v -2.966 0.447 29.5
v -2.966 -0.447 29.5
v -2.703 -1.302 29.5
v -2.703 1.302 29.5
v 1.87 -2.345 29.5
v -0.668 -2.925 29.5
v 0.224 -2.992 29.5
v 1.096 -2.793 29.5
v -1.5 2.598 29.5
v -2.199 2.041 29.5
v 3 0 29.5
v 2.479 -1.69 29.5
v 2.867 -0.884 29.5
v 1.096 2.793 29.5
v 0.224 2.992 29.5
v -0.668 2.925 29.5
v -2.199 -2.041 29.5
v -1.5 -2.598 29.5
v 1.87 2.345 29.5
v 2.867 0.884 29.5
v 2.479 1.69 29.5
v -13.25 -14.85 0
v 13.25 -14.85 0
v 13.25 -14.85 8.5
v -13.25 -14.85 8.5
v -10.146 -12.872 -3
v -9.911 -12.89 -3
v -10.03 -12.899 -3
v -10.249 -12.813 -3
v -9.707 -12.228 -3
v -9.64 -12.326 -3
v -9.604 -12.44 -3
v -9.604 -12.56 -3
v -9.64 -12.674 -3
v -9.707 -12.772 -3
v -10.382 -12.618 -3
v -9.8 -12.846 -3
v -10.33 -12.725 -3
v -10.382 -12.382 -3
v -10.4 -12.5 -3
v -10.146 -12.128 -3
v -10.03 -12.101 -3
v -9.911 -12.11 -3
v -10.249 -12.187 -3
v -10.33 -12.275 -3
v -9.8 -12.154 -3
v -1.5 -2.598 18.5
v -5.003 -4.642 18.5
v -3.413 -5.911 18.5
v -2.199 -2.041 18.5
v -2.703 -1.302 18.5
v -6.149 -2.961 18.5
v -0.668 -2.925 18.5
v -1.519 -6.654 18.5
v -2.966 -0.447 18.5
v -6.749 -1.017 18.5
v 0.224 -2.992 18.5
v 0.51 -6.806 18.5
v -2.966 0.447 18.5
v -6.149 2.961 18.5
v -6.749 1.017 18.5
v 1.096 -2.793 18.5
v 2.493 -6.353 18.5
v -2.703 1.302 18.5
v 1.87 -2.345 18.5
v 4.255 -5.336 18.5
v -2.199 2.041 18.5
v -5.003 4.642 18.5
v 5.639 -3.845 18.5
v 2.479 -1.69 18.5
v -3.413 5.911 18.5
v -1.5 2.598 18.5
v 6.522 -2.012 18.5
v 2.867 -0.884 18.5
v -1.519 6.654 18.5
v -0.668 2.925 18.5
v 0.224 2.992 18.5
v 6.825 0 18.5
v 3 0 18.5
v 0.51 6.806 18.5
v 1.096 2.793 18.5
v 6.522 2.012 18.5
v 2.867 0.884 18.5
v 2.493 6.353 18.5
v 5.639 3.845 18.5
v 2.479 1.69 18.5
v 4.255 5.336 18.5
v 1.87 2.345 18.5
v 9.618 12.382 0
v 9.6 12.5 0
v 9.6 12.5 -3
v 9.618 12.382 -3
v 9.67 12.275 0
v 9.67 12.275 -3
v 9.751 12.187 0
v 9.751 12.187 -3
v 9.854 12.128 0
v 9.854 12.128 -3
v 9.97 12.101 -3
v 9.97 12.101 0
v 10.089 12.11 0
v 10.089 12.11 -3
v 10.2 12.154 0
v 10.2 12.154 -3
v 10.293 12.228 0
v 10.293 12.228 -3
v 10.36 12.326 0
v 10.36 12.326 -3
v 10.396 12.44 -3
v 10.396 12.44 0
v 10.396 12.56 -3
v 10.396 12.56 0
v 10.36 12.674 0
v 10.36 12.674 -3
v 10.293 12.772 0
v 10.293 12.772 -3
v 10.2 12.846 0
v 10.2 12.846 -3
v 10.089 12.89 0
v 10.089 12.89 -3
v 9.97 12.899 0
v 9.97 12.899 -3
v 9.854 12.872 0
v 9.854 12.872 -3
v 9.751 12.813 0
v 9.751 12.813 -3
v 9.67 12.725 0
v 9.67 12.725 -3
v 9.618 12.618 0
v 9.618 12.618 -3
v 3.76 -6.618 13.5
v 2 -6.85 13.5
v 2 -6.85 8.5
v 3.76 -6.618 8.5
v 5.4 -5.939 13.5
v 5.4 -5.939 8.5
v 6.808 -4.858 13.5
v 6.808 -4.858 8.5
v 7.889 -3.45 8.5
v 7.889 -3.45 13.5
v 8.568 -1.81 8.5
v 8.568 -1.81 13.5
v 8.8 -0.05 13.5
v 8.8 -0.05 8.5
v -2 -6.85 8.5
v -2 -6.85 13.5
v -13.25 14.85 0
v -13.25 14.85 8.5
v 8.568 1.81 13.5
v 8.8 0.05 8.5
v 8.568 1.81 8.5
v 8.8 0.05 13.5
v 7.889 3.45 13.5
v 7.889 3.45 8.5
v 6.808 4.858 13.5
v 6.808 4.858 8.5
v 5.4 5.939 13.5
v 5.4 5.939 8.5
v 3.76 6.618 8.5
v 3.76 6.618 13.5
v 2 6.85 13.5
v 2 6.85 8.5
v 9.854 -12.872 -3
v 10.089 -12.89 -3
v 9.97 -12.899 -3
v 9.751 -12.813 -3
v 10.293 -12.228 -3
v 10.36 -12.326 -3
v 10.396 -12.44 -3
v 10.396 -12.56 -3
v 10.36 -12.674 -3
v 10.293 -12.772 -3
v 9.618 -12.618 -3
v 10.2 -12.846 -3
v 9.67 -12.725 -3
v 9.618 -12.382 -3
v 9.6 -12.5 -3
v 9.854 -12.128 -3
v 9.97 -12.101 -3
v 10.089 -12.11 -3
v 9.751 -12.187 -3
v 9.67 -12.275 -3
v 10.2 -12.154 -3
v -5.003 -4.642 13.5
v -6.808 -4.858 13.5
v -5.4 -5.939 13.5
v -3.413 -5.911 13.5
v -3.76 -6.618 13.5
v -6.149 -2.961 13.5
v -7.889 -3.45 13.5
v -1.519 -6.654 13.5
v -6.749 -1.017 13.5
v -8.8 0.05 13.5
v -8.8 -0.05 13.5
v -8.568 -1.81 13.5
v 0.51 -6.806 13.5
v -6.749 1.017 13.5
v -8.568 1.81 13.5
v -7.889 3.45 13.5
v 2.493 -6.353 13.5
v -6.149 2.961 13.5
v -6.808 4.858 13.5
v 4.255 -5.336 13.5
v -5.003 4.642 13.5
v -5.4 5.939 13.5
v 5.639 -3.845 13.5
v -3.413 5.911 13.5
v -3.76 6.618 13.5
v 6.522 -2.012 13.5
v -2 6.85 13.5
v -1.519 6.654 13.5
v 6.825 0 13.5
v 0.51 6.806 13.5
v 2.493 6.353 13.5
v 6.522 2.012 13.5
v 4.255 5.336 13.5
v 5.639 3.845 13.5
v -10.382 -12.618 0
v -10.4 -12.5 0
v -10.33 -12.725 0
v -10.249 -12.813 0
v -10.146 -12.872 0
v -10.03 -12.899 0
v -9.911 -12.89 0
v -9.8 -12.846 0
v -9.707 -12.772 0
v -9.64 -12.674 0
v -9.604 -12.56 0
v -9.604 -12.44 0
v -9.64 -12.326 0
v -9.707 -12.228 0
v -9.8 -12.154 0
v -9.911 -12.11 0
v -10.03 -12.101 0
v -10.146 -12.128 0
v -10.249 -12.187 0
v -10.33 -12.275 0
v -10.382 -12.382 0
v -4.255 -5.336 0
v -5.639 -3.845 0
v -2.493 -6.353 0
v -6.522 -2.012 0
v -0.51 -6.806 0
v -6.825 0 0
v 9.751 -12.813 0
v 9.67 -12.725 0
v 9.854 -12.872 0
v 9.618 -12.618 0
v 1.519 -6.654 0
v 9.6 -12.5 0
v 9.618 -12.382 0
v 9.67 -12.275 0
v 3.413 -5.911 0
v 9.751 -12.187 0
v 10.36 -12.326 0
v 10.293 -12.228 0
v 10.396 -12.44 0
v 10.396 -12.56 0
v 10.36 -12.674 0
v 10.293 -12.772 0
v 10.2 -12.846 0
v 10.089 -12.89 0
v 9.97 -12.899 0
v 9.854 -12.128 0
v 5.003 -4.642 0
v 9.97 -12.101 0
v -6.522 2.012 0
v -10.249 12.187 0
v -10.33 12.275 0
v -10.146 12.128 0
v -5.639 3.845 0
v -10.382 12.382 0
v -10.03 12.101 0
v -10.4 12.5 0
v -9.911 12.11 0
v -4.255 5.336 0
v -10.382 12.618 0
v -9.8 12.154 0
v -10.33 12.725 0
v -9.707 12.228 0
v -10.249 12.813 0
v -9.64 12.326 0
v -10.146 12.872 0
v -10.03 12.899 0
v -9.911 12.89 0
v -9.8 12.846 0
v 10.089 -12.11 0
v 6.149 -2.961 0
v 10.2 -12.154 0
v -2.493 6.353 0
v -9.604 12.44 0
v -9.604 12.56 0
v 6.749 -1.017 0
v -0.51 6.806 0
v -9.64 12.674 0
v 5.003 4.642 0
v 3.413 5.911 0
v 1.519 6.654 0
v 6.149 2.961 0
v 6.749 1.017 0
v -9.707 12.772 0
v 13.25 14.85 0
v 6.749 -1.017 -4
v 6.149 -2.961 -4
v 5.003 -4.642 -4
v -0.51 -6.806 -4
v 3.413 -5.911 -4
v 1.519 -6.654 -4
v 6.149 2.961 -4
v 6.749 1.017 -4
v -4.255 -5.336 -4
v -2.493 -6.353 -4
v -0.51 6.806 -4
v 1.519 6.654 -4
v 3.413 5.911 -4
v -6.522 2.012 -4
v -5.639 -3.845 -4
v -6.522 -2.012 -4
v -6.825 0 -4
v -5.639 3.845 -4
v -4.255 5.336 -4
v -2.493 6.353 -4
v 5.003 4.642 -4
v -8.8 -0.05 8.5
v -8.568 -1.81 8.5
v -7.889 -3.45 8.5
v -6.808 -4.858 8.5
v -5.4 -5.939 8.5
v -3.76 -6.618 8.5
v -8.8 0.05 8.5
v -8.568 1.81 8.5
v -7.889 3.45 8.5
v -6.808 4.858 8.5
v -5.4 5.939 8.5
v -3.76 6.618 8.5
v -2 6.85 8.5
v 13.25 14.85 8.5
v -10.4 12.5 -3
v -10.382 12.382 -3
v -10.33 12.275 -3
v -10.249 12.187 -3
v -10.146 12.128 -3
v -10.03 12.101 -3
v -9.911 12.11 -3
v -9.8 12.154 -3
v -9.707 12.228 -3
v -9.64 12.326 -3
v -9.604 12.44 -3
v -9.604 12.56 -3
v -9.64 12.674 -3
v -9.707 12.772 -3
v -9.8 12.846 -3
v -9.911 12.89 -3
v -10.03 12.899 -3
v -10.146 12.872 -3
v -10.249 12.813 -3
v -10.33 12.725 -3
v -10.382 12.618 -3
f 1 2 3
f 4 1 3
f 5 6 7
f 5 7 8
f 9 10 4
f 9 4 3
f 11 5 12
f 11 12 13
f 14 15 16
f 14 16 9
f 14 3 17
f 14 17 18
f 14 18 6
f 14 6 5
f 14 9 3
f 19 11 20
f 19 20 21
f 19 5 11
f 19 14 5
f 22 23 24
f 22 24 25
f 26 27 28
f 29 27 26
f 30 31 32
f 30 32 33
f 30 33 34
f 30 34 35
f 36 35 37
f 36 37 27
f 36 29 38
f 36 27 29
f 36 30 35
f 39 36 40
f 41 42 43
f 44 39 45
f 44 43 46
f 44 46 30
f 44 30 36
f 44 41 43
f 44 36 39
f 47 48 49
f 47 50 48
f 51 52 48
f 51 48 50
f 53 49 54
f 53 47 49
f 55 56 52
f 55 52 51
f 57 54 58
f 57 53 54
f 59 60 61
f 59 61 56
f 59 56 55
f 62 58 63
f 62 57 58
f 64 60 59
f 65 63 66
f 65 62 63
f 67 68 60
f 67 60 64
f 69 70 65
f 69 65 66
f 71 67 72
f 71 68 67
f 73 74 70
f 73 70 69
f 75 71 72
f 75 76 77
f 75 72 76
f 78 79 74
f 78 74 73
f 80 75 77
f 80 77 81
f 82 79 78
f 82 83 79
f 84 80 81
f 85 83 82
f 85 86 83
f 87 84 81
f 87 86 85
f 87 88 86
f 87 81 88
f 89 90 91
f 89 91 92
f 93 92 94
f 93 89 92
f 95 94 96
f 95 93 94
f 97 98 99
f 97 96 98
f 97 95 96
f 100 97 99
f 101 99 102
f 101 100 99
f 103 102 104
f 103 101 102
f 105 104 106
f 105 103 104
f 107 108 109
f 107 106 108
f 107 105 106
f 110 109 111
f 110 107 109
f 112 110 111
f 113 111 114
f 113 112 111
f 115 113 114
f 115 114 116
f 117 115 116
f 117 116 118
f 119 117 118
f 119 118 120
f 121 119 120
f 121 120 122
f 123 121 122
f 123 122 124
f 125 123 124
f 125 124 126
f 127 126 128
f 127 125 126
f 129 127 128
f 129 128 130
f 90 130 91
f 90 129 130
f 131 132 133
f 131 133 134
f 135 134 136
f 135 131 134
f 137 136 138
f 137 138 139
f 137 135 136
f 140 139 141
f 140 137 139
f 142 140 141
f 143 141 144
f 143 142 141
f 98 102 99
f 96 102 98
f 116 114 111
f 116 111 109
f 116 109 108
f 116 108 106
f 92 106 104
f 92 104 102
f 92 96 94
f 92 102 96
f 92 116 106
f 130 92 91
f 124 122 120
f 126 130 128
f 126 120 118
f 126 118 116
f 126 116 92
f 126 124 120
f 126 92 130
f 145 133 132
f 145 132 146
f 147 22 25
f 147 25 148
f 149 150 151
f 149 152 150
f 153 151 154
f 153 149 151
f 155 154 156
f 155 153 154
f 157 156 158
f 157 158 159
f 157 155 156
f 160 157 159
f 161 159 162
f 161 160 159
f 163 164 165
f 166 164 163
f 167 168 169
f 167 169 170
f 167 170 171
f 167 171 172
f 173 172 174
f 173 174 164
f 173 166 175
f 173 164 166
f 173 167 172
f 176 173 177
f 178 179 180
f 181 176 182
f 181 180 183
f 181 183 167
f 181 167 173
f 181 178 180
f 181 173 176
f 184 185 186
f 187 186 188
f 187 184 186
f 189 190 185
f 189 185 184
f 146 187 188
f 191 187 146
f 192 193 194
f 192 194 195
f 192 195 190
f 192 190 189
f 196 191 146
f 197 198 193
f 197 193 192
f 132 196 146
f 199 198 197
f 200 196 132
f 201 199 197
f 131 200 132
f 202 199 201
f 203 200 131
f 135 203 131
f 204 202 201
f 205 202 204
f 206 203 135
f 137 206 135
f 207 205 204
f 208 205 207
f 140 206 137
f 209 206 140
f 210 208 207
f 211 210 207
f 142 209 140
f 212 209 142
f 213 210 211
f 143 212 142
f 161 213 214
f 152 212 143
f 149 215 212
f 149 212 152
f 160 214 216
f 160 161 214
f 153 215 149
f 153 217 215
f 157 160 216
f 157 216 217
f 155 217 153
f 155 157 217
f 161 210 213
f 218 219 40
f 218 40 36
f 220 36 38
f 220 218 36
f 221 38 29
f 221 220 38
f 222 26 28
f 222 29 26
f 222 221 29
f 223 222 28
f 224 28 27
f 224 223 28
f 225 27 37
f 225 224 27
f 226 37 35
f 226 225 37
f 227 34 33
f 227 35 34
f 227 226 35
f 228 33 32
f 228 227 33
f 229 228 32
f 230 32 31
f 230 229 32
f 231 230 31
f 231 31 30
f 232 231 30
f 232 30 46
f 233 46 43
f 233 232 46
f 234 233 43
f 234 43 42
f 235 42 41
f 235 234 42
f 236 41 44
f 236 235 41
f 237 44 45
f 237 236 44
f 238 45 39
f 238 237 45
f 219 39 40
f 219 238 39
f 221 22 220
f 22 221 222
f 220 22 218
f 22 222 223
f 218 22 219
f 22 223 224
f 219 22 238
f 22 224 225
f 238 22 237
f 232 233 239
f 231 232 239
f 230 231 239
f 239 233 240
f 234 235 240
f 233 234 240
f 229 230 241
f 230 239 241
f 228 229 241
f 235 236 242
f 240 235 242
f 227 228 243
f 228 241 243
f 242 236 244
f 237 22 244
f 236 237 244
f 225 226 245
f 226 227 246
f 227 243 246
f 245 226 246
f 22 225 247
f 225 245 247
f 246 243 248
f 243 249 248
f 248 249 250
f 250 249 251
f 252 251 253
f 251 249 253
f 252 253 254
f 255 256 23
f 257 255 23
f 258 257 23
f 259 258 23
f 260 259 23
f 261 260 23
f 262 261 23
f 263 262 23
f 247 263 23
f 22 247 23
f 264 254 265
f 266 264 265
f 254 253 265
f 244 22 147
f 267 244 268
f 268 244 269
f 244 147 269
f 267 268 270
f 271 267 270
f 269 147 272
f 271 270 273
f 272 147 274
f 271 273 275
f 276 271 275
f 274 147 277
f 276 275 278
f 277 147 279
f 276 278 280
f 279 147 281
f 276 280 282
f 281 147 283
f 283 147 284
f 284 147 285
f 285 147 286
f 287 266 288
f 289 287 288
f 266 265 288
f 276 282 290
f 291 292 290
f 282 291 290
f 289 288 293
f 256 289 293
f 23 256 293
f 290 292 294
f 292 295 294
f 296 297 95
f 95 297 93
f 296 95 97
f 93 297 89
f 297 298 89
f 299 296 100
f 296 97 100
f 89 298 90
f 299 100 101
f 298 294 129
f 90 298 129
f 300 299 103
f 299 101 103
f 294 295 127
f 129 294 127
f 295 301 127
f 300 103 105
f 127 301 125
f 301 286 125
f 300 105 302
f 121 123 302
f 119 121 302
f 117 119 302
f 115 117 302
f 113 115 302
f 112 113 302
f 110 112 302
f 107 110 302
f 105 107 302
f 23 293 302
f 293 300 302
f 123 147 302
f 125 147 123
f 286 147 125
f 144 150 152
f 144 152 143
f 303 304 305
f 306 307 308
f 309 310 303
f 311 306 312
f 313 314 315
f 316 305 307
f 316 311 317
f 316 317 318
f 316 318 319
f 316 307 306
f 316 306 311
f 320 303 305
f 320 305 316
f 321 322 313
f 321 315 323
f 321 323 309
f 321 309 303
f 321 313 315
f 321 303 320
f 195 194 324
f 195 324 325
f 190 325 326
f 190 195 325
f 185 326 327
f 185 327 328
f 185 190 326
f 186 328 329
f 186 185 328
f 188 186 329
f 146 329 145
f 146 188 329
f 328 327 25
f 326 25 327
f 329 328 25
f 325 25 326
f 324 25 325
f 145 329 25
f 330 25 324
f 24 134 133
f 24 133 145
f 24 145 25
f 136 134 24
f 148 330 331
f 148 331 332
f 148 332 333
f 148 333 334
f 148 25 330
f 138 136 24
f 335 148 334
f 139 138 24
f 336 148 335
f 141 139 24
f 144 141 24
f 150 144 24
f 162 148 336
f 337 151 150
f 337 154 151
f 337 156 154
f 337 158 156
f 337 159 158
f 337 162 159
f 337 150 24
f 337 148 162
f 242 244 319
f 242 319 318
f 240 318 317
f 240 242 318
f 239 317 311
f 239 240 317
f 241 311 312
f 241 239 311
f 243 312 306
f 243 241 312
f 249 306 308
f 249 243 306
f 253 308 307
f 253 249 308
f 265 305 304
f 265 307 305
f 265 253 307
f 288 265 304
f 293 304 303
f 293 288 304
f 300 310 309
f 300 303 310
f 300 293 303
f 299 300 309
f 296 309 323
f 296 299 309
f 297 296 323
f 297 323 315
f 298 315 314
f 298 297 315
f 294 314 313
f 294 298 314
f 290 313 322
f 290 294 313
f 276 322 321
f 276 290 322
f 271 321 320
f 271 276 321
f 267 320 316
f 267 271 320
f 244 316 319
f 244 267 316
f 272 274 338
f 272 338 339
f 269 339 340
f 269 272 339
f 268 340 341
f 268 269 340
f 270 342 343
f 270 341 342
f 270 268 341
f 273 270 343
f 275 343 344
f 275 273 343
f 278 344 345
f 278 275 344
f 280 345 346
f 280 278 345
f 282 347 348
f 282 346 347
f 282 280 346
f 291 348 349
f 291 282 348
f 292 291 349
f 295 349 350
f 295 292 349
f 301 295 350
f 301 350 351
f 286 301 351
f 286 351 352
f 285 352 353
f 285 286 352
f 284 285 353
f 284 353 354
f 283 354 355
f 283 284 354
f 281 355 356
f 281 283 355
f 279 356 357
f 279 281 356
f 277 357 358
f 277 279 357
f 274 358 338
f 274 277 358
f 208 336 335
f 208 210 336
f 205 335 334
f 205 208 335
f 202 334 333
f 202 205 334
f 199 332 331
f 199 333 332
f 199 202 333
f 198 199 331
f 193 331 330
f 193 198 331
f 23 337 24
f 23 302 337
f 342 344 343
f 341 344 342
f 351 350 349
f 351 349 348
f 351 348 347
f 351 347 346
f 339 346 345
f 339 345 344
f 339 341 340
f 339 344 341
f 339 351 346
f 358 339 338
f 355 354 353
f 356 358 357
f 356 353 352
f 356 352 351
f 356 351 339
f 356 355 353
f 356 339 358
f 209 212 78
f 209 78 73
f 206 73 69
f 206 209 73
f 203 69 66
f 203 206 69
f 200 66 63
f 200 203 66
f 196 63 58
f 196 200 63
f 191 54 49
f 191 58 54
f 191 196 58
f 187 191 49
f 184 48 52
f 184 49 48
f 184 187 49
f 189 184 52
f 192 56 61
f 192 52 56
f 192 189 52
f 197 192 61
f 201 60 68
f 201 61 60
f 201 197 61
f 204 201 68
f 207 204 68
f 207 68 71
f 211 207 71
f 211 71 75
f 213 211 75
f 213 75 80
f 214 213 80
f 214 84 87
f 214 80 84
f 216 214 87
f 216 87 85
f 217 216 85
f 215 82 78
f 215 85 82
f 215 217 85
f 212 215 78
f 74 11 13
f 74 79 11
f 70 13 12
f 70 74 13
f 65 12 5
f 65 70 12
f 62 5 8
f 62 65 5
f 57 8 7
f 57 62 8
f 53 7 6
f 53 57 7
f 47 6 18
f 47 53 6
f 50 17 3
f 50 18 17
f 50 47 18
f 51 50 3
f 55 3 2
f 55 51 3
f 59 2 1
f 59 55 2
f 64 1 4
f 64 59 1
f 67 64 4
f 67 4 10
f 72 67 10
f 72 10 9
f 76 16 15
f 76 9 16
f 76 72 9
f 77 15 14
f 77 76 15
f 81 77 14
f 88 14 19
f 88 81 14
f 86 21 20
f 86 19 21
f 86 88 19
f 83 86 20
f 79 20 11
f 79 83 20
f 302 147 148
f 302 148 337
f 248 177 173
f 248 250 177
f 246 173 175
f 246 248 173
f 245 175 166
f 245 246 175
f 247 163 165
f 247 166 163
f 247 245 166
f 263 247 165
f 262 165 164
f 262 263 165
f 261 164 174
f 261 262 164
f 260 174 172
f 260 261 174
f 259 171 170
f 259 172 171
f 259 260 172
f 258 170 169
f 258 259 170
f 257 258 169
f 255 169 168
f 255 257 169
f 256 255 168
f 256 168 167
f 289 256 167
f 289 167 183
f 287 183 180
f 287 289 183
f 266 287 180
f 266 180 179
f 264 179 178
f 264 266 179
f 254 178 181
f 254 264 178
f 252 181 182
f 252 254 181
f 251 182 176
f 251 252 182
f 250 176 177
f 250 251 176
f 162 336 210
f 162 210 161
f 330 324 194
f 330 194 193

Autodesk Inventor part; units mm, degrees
ref_plane "YZ Plane" through (0, 0, 0) normal (1, 0, 0) x (0, 1, 0)
ref_plane "XZ Plane" through (0, 0, 0) normal (0, 1, 0) x (-1, 0, 0)
ref_plane "XY Plane" through (0, 0, 0) normal (0, 0, 1) x (1, 0, 0)
sketch "Sketch1" plane through (0, 0, 0) normal (0, 0, 1) x (1, 0, 0)
  line L0 (-13.25, 14.85) -> (13.25, 14.85)
  line L1 (13.25, 14.85) -> (13.25, -14.85)
  line L2 (13.25, -14.85) -> (-13.25, -14.85)
  line L3 (-13.25, -14.85) -> (-13.25, 14.85)
  line L4 (-13.25, 14.85) -> (13.25, -14.85) construction
  line L5 (13.25, 14.85) -> (-13.25, -14.85) construction
  point P0 (0, 0)
  dimension "d0" = 26.5
  dimension "d1" = 29.7
extrude "Extrusion1" add sketch "Sketch1" along normal blind 8.5
sketch "Sketch2" plane through (0, 0, 8.5) normal (0, 0, 1) x (1, 0, 0)
  line L0 (-8.8, 6.85) -> (8.8, 6.85)
  line L1 (8.8, 6.85) -> (8.8, -6.85)
  line L2 (8.8, -6.85) -> (-8.8, -6.85)
  line L3 (-8.8, -6.85) -> (-8.8, 6.85)
  line L4 (-8.8, 6.85) -> (8.8, -6.85) construction
  line L5 (8.8, 6.85) -> (-8.8, -6.85) construction
  point P0 (0, 0)
  dimension "d4" = 17.6
  dimension "d5" = 13.7
extrude "Extrusion2" add sketch "Sketch2" along normal blind 5
fillet "Fillet1" radius 6.8 4 edges at (8.8, 6.85, 11) (8.8, -6.85, 11) (-8.8, 6.85, 11) (-8.8, -6.85, 11)
sketch "Sketch3" plane through (0, 0, 13.5) normal (0, 0, 1) x (1, 0, 0)
  circle A0 centre (0, 0) radius 6.825
  dimension "d9" = 13.65
extrude "Extrusion3" add sketch "Sketch3" along normal blind 5
sketch "Sketch4" plane through (0, 0, 18.5) normal (0, 0, 1) x (1, 0, 0)
  circle A0 centre (0, 0) radius 3
  dimension "d12" = 6
extrude "Extrusion4" add sketch "Sketch4" along normal blind 11
sketch "Sketch5" plane through (0, 0, 0) normal (0, 0, -1) x (-1, 0, 0)
  line L0 (-10, 12.5) -> (10, 12.5) construction
  line L1 (10, 12.5) -> (10, -12.5) construction
  line L2 (10, -12.5) -> (-10, -12.5) construction
  line L3 (-10, -12.5) -> (-10, 12.5) construction
  line L4 (-10, 12.5) -> (10, -12.5) construction
  line L5 (10, 12.5) -> (-10, -12.5) construction
  circle A0 centre (10, 12.5) radius 0.4
  circle A1 centre (-10, -12.5) radius 0.4
  circle A2 centre (10, -12.5) radius 0.4
  circle A3 centre (-10, 12.5) radius 0.4
  point P0 (0, 0)
  dimension "d15" = 20
  dimension "d16" = 25
  dimension "d18" = 0.8
  dimension "d19" = 0.8
  dimension "d20" = 0.8
  dimension "d21" = 0.8
extrude "Extrusion5" add sketch "Sketch5" along normal blind 3
sketch "Sketch6" plane through (0, 0, 0) normal (0, 0, -1) x (-1, 0, 0)
  circle A0 centre (0, 0) radius 6.825 projected
extrude "Extrusion6" add sketch "Sketch6" along normal blind 4
properties part number "Encoder" material "ABS Plastic"
